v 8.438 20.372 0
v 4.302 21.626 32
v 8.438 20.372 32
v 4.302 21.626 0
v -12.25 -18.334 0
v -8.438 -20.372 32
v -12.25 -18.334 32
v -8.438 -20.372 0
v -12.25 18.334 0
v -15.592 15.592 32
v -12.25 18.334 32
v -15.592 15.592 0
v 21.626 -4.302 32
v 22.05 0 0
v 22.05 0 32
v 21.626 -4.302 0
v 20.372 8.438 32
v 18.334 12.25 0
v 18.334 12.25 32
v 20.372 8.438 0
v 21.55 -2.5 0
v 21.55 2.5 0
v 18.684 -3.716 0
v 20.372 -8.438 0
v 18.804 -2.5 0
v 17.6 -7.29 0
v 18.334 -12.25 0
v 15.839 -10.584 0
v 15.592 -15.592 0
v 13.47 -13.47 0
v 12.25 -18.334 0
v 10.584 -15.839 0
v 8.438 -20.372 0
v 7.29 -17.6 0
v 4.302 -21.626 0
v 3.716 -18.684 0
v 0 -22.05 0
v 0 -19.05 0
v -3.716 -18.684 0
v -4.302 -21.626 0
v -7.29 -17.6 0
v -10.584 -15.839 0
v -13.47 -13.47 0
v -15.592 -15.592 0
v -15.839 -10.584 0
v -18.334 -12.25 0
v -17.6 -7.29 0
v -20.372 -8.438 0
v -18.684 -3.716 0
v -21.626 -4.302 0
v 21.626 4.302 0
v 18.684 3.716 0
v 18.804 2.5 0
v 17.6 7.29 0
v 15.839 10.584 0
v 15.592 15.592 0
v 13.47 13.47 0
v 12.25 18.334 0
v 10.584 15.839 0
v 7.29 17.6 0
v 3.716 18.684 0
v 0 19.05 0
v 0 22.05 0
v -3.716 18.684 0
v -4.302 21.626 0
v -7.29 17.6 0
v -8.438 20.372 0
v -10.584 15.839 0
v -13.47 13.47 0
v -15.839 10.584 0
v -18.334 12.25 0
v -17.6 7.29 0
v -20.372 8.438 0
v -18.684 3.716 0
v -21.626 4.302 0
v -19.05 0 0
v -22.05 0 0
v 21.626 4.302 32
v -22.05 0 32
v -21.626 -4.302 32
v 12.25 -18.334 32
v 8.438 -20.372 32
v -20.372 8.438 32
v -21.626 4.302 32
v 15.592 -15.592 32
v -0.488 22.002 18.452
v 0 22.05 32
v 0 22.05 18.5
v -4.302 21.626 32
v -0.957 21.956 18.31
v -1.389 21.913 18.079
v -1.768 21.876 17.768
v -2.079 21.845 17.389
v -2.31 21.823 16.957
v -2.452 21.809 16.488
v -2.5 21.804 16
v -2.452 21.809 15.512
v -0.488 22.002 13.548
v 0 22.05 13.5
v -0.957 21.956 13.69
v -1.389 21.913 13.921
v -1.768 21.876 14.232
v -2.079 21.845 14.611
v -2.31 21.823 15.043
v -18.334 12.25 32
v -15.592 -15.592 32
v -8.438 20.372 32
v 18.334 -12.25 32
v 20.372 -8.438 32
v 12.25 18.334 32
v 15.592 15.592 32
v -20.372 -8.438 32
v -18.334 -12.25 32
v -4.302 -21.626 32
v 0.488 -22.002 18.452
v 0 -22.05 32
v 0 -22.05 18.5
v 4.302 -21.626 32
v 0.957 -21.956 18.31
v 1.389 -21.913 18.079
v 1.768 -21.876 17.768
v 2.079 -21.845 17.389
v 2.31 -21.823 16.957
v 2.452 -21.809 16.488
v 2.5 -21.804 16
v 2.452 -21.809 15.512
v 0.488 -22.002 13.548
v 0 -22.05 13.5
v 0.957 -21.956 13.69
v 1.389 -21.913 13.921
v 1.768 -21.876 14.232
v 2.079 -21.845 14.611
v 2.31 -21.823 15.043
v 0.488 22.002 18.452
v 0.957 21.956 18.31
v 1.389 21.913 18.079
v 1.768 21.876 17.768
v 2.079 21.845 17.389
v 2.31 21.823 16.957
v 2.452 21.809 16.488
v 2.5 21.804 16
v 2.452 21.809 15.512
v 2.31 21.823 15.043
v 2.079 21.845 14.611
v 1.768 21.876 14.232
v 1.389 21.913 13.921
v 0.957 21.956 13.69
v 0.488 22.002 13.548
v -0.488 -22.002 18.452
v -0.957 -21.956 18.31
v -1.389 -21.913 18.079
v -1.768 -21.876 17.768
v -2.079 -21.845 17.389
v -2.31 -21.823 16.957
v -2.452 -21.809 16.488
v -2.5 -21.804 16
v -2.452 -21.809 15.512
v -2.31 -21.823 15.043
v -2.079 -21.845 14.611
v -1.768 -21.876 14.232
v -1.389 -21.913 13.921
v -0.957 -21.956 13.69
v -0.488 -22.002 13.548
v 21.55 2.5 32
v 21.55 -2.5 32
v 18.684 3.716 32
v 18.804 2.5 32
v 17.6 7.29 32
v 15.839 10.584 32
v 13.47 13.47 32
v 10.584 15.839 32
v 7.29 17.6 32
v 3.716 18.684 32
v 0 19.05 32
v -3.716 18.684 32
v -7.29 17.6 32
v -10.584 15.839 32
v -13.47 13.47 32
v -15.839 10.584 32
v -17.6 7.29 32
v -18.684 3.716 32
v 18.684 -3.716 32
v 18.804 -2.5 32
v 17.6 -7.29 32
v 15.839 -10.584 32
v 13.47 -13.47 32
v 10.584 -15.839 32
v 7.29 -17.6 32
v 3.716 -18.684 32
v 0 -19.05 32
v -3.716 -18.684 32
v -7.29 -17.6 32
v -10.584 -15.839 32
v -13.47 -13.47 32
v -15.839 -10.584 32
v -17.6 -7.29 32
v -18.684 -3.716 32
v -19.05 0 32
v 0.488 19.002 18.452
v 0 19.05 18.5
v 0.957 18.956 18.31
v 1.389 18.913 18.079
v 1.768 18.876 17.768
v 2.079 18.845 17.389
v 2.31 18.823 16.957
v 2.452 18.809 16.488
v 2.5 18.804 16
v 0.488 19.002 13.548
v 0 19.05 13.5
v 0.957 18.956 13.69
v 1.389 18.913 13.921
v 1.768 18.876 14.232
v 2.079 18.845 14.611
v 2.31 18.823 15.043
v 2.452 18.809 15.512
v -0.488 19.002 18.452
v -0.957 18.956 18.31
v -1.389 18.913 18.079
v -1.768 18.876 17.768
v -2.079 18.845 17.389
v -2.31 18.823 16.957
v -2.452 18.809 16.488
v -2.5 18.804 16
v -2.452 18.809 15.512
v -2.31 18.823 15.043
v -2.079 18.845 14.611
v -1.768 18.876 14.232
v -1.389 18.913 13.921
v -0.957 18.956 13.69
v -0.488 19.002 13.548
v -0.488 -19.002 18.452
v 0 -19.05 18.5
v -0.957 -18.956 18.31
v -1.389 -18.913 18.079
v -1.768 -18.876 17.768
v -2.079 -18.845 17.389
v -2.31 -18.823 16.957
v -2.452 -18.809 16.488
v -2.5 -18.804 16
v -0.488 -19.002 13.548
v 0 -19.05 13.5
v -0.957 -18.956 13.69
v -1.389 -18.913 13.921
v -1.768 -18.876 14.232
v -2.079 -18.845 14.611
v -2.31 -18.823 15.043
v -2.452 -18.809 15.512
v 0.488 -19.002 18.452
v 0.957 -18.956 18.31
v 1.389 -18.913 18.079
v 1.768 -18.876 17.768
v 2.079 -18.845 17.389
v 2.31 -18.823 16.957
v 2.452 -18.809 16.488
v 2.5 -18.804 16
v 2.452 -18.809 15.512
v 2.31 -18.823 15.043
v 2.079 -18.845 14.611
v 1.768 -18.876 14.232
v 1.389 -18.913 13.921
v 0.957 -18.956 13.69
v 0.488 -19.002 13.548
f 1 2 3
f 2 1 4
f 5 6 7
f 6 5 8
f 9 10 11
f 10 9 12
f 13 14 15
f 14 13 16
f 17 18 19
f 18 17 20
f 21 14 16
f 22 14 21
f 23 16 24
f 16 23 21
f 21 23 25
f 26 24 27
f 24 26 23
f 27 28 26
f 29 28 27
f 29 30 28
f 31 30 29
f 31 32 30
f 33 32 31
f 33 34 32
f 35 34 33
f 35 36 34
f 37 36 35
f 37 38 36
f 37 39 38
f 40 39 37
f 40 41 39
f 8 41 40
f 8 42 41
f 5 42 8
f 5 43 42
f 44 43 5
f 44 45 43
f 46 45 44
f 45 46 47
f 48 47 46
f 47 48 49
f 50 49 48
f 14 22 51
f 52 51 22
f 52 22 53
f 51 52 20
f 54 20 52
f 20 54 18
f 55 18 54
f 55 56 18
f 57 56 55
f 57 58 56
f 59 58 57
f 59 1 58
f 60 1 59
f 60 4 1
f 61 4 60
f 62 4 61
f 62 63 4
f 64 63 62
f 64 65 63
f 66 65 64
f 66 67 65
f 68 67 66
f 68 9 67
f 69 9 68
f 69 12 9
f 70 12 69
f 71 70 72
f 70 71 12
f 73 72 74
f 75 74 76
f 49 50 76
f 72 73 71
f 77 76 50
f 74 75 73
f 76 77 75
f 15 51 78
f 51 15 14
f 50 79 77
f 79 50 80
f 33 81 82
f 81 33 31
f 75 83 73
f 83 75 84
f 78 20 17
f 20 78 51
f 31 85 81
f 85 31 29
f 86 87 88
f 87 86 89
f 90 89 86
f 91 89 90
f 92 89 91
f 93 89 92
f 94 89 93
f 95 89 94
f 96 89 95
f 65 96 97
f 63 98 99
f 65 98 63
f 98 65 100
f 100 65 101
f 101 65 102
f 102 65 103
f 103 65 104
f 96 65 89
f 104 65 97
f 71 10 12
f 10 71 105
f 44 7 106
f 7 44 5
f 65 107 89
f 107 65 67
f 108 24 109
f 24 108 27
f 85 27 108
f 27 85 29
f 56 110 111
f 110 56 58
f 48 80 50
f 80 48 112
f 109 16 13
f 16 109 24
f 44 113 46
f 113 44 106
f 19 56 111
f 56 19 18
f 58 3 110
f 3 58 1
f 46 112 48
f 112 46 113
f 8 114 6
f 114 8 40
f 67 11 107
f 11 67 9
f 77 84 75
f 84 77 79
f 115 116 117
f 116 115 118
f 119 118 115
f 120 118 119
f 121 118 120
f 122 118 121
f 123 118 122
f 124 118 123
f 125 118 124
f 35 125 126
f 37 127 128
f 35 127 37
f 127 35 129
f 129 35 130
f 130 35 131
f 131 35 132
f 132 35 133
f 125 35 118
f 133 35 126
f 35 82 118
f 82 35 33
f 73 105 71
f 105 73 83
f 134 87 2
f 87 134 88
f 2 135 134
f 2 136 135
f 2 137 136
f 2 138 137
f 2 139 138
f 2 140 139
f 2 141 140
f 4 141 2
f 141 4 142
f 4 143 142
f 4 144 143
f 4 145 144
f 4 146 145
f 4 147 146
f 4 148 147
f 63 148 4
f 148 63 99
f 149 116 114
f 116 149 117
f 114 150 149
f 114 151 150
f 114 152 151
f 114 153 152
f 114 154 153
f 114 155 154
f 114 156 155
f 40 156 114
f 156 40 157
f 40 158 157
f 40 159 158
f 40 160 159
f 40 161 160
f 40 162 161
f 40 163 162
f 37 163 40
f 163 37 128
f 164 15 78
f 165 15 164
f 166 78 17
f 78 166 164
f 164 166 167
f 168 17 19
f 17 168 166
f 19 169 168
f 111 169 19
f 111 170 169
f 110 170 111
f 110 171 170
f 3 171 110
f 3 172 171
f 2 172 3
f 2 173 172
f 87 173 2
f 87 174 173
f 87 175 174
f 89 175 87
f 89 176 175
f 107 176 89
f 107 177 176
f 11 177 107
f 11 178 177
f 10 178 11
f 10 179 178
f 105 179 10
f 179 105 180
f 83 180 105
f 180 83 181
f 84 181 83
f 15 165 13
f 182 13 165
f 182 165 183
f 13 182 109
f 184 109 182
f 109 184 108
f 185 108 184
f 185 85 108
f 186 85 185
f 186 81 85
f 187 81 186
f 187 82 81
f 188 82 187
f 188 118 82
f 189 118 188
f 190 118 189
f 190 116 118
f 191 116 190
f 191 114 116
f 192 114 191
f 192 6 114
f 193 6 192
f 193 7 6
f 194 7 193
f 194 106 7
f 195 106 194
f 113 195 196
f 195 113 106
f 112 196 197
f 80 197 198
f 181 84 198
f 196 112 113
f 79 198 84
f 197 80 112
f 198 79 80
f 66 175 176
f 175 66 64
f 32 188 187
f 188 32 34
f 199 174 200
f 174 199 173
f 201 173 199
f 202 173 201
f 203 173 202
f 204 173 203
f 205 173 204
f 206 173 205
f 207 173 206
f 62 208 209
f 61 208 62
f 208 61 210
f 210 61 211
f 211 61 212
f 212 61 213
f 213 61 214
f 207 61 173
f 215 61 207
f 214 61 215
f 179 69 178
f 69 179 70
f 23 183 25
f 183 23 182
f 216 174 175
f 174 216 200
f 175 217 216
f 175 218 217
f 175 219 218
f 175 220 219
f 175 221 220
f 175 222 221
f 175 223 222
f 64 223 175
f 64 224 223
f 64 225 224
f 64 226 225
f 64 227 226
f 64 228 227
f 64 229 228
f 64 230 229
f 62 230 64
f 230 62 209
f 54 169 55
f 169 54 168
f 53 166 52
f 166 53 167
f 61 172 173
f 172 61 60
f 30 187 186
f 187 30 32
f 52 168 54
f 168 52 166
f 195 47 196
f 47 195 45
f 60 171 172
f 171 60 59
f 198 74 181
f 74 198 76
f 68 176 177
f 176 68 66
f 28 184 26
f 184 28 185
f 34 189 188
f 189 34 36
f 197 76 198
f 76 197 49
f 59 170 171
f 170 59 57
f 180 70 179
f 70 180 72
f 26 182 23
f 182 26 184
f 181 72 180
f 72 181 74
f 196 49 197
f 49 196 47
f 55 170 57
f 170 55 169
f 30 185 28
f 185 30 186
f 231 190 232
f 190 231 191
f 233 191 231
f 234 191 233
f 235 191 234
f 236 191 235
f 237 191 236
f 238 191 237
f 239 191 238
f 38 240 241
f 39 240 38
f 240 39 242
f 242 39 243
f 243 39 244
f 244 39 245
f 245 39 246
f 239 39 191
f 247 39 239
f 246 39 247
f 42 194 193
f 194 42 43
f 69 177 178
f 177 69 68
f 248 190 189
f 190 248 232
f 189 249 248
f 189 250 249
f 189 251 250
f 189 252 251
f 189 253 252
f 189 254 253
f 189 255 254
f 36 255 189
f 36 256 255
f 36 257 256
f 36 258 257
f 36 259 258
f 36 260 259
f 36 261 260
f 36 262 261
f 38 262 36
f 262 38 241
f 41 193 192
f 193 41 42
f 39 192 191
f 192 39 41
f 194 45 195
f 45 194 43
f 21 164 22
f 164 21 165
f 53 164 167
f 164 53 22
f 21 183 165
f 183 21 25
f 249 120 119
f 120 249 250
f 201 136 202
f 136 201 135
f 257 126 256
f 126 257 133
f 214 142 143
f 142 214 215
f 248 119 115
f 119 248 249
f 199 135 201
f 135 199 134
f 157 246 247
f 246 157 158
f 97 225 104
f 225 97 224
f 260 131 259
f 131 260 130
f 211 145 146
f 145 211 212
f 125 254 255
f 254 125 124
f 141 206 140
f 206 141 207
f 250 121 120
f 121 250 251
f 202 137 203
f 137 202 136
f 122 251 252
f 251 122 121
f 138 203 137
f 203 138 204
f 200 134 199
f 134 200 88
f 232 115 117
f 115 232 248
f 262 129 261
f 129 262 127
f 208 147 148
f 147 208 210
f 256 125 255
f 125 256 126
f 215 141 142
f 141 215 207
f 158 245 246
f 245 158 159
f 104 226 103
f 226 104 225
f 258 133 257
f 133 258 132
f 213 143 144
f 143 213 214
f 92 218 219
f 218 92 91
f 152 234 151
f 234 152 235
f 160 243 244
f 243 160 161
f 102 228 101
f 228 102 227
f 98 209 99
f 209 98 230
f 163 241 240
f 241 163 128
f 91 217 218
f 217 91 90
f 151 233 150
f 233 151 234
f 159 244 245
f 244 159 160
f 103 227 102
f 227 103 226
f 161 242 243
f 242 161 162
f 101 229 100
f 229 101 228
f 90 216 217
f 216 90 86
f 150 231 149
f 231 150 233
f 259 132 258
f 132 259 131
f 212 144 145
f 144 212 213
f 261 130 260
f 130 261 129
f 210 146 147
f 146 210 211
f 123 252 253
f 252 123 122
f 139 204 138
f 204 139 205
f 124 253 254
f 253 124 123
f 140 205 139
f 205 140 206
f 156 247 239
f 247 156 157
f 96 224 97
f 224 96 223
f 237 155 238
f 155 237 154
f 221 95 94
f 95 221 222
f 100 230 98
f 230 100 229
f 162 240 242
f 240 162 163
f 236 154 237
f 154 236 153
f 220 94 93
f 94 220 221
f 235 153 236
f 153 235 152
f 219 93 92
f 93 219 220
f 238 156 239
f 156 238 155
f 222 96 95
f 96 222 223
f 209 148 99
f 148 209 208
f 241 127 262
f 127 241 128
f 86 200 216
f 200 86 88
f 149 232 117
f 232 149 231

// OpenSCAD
$fn = 32;

// ----------------------------------------------------------------------
// Worm wheel: z16 module 2, 35 degree helix, 32 mm hub
// ----------------------------------------------------------------------

// --- parameters (mm) ---
gear_module = 2;          // tooth module
teeth = 16;               // tooth count
helix = 35;               // helix angle of the rim
rim_w = 18;               // rim width
hub_r = 22.05;            // hub radius
hub_h = 32;               // hub height
bore_d = 38.1;            // hub bore
key_w = 5;                // keyway width
key_depth = 2.5;          // keyway depth
screw_d = 5;              // set screw thread

rim_profile = [[13.414, -1.521], [15.981, -1.553], [16.987, -1.192], [17.988, -0.666], [17.988, 0.666], [16.987, 1.192], [15.981, 1.553], [13.414, 1.521], [12.975, 3.728], [15.359, 4.681], [16.15, 5.399], [16.873, 6.269], [16.364, 7.498], [15.237, 7.602], [14.171, 7.551], [11.811, 6.538], [10.561, 8.41], [12.399, 10.202], [12.854, 11.168], [13.19, 12.249], [12.249, 13.19], [11.168, 12.854], [10.202, 12.399], [8.41, 10.561], [6.538, 11.811], [7.551, 14.171], [7.602, 15.237], [7.498, 16.364], [6.269, 16.873], [5.399, 16.15], [4.681, 15.359], [3.728, 12.975], [1.521, 13.414], [1.553, 15.981], [1.192, 16.987], [0.666, 17.988], [-0.666, 17.988], [-1.192, 16.987], [-1.553, 15.981], [-1.521, 13.414], [-3.728, 12.975], [-4.681, 15.359], [-5.399, 16.15], [-6.269, 16.873], [-7.498, 16.364], [-7.602, 15.237], [-7.551, 14.171], [-6.538, 11.811], [-8.41, 10.561], [-10.202, 12.399], [-11.168, 12.854], [-12.249, 13.19], [-13.19, 12.249], [-12.854, 11.168], [-12.399, 10.202], [-10.561, 8.41], [-11.811, 6.538], [-14.171, 7.551], [-15.237, 7.602], [-16.364, 7.498], [-16.873, 6.269], [-16.15, 5.399], [-15.359, 4.681], [-12.975, 3.728], [-13.414, 1.521], [-15.981, 1.553], [-16.987, 1.192], [-17.988, 0.666], [-17.988, -0.666], [-16.987, -1.192], [-15.981, -1.553], [-13.414, -1.521], [-12.975, -3.728], [-15.359, -4.681], [-16.15, -5.399], [-16.873, -6.269], [-16.364, -7.498], [-15.237, -7.602], [-14.171, -7.551], [-11.811, -6.538], [-10.561, -8.41], [-12.399, -10.202], [-12.854, -11.168], [-13.19, -12.249], [-12.249, -13.19], [-11.168, -12.854], [-10.202, -12.399], [-8.41, -10.561], [-6.538, -11.811], [-7.551, -14.171], [-7.602, -15.237], [-7.498, -16.364], [-6.269, -16.873], [-5.399, -16.15], [-4.681, -15.359], [-3.728, -12.975], [-1.521, -13.414], [-1.553, -15.981], [-1.192, -16.987], [-0.666, -17.988], [0.666, -17.988], [1.192, -16.987], [1.553, -15.981], [1.521, -13.414], [3.728, -12.975], [4.681, -15.359], [5.399, -16.15], [6.269, -16.873], [7.498, -16.364], [7.602, -15.237], [7.551, -14.171], [6.538, -11.811], [8.41, -10.561], [10.202, -12.399], [11.168, -12.854], [12.249, -13.19], [13.19, -12.249], [12.854, -11.168], [12.399, -10.202], [10.561, -8.41], [11.811, -6.538], [14.171, -7.551], [15.237, -7.602], [16.364, -7.498], [16.873, -6.269], [16.15, -5.399], [15.359, -4.681], [12.975, -3.728]];

difference() {
  union() {
    /* rim, twisted to stand in for the helical worm teeth */
    translate([0, 0, (hub_h - rim_w) / 2]) linear_extrude(height = rim_w, twist = helix, slices = 24) polygon(rim_profile);
    /* hub */
    cylinder(h = hub_h, d = 2 * hub_r);
  }
  /* bore */
  translate([0, 0, -2.5]) cylinder(h = hub_h + 5, d = bore_d);
  /* keyway, milled through the whole hub */
  translate([bore_d / 2 - key_depth, -key_w / 2, -2.5]) cube([key_depth + 2.5, key_w, hub_h + 5]);
  /* set screw hole straight through the hub wall */
  translate([0, -hub_r - 2.5, hub_h / 2]) rotate([-90, 0, 0]) cylinder(h = 2 * hub_r + 5, d = screw_d);
}
